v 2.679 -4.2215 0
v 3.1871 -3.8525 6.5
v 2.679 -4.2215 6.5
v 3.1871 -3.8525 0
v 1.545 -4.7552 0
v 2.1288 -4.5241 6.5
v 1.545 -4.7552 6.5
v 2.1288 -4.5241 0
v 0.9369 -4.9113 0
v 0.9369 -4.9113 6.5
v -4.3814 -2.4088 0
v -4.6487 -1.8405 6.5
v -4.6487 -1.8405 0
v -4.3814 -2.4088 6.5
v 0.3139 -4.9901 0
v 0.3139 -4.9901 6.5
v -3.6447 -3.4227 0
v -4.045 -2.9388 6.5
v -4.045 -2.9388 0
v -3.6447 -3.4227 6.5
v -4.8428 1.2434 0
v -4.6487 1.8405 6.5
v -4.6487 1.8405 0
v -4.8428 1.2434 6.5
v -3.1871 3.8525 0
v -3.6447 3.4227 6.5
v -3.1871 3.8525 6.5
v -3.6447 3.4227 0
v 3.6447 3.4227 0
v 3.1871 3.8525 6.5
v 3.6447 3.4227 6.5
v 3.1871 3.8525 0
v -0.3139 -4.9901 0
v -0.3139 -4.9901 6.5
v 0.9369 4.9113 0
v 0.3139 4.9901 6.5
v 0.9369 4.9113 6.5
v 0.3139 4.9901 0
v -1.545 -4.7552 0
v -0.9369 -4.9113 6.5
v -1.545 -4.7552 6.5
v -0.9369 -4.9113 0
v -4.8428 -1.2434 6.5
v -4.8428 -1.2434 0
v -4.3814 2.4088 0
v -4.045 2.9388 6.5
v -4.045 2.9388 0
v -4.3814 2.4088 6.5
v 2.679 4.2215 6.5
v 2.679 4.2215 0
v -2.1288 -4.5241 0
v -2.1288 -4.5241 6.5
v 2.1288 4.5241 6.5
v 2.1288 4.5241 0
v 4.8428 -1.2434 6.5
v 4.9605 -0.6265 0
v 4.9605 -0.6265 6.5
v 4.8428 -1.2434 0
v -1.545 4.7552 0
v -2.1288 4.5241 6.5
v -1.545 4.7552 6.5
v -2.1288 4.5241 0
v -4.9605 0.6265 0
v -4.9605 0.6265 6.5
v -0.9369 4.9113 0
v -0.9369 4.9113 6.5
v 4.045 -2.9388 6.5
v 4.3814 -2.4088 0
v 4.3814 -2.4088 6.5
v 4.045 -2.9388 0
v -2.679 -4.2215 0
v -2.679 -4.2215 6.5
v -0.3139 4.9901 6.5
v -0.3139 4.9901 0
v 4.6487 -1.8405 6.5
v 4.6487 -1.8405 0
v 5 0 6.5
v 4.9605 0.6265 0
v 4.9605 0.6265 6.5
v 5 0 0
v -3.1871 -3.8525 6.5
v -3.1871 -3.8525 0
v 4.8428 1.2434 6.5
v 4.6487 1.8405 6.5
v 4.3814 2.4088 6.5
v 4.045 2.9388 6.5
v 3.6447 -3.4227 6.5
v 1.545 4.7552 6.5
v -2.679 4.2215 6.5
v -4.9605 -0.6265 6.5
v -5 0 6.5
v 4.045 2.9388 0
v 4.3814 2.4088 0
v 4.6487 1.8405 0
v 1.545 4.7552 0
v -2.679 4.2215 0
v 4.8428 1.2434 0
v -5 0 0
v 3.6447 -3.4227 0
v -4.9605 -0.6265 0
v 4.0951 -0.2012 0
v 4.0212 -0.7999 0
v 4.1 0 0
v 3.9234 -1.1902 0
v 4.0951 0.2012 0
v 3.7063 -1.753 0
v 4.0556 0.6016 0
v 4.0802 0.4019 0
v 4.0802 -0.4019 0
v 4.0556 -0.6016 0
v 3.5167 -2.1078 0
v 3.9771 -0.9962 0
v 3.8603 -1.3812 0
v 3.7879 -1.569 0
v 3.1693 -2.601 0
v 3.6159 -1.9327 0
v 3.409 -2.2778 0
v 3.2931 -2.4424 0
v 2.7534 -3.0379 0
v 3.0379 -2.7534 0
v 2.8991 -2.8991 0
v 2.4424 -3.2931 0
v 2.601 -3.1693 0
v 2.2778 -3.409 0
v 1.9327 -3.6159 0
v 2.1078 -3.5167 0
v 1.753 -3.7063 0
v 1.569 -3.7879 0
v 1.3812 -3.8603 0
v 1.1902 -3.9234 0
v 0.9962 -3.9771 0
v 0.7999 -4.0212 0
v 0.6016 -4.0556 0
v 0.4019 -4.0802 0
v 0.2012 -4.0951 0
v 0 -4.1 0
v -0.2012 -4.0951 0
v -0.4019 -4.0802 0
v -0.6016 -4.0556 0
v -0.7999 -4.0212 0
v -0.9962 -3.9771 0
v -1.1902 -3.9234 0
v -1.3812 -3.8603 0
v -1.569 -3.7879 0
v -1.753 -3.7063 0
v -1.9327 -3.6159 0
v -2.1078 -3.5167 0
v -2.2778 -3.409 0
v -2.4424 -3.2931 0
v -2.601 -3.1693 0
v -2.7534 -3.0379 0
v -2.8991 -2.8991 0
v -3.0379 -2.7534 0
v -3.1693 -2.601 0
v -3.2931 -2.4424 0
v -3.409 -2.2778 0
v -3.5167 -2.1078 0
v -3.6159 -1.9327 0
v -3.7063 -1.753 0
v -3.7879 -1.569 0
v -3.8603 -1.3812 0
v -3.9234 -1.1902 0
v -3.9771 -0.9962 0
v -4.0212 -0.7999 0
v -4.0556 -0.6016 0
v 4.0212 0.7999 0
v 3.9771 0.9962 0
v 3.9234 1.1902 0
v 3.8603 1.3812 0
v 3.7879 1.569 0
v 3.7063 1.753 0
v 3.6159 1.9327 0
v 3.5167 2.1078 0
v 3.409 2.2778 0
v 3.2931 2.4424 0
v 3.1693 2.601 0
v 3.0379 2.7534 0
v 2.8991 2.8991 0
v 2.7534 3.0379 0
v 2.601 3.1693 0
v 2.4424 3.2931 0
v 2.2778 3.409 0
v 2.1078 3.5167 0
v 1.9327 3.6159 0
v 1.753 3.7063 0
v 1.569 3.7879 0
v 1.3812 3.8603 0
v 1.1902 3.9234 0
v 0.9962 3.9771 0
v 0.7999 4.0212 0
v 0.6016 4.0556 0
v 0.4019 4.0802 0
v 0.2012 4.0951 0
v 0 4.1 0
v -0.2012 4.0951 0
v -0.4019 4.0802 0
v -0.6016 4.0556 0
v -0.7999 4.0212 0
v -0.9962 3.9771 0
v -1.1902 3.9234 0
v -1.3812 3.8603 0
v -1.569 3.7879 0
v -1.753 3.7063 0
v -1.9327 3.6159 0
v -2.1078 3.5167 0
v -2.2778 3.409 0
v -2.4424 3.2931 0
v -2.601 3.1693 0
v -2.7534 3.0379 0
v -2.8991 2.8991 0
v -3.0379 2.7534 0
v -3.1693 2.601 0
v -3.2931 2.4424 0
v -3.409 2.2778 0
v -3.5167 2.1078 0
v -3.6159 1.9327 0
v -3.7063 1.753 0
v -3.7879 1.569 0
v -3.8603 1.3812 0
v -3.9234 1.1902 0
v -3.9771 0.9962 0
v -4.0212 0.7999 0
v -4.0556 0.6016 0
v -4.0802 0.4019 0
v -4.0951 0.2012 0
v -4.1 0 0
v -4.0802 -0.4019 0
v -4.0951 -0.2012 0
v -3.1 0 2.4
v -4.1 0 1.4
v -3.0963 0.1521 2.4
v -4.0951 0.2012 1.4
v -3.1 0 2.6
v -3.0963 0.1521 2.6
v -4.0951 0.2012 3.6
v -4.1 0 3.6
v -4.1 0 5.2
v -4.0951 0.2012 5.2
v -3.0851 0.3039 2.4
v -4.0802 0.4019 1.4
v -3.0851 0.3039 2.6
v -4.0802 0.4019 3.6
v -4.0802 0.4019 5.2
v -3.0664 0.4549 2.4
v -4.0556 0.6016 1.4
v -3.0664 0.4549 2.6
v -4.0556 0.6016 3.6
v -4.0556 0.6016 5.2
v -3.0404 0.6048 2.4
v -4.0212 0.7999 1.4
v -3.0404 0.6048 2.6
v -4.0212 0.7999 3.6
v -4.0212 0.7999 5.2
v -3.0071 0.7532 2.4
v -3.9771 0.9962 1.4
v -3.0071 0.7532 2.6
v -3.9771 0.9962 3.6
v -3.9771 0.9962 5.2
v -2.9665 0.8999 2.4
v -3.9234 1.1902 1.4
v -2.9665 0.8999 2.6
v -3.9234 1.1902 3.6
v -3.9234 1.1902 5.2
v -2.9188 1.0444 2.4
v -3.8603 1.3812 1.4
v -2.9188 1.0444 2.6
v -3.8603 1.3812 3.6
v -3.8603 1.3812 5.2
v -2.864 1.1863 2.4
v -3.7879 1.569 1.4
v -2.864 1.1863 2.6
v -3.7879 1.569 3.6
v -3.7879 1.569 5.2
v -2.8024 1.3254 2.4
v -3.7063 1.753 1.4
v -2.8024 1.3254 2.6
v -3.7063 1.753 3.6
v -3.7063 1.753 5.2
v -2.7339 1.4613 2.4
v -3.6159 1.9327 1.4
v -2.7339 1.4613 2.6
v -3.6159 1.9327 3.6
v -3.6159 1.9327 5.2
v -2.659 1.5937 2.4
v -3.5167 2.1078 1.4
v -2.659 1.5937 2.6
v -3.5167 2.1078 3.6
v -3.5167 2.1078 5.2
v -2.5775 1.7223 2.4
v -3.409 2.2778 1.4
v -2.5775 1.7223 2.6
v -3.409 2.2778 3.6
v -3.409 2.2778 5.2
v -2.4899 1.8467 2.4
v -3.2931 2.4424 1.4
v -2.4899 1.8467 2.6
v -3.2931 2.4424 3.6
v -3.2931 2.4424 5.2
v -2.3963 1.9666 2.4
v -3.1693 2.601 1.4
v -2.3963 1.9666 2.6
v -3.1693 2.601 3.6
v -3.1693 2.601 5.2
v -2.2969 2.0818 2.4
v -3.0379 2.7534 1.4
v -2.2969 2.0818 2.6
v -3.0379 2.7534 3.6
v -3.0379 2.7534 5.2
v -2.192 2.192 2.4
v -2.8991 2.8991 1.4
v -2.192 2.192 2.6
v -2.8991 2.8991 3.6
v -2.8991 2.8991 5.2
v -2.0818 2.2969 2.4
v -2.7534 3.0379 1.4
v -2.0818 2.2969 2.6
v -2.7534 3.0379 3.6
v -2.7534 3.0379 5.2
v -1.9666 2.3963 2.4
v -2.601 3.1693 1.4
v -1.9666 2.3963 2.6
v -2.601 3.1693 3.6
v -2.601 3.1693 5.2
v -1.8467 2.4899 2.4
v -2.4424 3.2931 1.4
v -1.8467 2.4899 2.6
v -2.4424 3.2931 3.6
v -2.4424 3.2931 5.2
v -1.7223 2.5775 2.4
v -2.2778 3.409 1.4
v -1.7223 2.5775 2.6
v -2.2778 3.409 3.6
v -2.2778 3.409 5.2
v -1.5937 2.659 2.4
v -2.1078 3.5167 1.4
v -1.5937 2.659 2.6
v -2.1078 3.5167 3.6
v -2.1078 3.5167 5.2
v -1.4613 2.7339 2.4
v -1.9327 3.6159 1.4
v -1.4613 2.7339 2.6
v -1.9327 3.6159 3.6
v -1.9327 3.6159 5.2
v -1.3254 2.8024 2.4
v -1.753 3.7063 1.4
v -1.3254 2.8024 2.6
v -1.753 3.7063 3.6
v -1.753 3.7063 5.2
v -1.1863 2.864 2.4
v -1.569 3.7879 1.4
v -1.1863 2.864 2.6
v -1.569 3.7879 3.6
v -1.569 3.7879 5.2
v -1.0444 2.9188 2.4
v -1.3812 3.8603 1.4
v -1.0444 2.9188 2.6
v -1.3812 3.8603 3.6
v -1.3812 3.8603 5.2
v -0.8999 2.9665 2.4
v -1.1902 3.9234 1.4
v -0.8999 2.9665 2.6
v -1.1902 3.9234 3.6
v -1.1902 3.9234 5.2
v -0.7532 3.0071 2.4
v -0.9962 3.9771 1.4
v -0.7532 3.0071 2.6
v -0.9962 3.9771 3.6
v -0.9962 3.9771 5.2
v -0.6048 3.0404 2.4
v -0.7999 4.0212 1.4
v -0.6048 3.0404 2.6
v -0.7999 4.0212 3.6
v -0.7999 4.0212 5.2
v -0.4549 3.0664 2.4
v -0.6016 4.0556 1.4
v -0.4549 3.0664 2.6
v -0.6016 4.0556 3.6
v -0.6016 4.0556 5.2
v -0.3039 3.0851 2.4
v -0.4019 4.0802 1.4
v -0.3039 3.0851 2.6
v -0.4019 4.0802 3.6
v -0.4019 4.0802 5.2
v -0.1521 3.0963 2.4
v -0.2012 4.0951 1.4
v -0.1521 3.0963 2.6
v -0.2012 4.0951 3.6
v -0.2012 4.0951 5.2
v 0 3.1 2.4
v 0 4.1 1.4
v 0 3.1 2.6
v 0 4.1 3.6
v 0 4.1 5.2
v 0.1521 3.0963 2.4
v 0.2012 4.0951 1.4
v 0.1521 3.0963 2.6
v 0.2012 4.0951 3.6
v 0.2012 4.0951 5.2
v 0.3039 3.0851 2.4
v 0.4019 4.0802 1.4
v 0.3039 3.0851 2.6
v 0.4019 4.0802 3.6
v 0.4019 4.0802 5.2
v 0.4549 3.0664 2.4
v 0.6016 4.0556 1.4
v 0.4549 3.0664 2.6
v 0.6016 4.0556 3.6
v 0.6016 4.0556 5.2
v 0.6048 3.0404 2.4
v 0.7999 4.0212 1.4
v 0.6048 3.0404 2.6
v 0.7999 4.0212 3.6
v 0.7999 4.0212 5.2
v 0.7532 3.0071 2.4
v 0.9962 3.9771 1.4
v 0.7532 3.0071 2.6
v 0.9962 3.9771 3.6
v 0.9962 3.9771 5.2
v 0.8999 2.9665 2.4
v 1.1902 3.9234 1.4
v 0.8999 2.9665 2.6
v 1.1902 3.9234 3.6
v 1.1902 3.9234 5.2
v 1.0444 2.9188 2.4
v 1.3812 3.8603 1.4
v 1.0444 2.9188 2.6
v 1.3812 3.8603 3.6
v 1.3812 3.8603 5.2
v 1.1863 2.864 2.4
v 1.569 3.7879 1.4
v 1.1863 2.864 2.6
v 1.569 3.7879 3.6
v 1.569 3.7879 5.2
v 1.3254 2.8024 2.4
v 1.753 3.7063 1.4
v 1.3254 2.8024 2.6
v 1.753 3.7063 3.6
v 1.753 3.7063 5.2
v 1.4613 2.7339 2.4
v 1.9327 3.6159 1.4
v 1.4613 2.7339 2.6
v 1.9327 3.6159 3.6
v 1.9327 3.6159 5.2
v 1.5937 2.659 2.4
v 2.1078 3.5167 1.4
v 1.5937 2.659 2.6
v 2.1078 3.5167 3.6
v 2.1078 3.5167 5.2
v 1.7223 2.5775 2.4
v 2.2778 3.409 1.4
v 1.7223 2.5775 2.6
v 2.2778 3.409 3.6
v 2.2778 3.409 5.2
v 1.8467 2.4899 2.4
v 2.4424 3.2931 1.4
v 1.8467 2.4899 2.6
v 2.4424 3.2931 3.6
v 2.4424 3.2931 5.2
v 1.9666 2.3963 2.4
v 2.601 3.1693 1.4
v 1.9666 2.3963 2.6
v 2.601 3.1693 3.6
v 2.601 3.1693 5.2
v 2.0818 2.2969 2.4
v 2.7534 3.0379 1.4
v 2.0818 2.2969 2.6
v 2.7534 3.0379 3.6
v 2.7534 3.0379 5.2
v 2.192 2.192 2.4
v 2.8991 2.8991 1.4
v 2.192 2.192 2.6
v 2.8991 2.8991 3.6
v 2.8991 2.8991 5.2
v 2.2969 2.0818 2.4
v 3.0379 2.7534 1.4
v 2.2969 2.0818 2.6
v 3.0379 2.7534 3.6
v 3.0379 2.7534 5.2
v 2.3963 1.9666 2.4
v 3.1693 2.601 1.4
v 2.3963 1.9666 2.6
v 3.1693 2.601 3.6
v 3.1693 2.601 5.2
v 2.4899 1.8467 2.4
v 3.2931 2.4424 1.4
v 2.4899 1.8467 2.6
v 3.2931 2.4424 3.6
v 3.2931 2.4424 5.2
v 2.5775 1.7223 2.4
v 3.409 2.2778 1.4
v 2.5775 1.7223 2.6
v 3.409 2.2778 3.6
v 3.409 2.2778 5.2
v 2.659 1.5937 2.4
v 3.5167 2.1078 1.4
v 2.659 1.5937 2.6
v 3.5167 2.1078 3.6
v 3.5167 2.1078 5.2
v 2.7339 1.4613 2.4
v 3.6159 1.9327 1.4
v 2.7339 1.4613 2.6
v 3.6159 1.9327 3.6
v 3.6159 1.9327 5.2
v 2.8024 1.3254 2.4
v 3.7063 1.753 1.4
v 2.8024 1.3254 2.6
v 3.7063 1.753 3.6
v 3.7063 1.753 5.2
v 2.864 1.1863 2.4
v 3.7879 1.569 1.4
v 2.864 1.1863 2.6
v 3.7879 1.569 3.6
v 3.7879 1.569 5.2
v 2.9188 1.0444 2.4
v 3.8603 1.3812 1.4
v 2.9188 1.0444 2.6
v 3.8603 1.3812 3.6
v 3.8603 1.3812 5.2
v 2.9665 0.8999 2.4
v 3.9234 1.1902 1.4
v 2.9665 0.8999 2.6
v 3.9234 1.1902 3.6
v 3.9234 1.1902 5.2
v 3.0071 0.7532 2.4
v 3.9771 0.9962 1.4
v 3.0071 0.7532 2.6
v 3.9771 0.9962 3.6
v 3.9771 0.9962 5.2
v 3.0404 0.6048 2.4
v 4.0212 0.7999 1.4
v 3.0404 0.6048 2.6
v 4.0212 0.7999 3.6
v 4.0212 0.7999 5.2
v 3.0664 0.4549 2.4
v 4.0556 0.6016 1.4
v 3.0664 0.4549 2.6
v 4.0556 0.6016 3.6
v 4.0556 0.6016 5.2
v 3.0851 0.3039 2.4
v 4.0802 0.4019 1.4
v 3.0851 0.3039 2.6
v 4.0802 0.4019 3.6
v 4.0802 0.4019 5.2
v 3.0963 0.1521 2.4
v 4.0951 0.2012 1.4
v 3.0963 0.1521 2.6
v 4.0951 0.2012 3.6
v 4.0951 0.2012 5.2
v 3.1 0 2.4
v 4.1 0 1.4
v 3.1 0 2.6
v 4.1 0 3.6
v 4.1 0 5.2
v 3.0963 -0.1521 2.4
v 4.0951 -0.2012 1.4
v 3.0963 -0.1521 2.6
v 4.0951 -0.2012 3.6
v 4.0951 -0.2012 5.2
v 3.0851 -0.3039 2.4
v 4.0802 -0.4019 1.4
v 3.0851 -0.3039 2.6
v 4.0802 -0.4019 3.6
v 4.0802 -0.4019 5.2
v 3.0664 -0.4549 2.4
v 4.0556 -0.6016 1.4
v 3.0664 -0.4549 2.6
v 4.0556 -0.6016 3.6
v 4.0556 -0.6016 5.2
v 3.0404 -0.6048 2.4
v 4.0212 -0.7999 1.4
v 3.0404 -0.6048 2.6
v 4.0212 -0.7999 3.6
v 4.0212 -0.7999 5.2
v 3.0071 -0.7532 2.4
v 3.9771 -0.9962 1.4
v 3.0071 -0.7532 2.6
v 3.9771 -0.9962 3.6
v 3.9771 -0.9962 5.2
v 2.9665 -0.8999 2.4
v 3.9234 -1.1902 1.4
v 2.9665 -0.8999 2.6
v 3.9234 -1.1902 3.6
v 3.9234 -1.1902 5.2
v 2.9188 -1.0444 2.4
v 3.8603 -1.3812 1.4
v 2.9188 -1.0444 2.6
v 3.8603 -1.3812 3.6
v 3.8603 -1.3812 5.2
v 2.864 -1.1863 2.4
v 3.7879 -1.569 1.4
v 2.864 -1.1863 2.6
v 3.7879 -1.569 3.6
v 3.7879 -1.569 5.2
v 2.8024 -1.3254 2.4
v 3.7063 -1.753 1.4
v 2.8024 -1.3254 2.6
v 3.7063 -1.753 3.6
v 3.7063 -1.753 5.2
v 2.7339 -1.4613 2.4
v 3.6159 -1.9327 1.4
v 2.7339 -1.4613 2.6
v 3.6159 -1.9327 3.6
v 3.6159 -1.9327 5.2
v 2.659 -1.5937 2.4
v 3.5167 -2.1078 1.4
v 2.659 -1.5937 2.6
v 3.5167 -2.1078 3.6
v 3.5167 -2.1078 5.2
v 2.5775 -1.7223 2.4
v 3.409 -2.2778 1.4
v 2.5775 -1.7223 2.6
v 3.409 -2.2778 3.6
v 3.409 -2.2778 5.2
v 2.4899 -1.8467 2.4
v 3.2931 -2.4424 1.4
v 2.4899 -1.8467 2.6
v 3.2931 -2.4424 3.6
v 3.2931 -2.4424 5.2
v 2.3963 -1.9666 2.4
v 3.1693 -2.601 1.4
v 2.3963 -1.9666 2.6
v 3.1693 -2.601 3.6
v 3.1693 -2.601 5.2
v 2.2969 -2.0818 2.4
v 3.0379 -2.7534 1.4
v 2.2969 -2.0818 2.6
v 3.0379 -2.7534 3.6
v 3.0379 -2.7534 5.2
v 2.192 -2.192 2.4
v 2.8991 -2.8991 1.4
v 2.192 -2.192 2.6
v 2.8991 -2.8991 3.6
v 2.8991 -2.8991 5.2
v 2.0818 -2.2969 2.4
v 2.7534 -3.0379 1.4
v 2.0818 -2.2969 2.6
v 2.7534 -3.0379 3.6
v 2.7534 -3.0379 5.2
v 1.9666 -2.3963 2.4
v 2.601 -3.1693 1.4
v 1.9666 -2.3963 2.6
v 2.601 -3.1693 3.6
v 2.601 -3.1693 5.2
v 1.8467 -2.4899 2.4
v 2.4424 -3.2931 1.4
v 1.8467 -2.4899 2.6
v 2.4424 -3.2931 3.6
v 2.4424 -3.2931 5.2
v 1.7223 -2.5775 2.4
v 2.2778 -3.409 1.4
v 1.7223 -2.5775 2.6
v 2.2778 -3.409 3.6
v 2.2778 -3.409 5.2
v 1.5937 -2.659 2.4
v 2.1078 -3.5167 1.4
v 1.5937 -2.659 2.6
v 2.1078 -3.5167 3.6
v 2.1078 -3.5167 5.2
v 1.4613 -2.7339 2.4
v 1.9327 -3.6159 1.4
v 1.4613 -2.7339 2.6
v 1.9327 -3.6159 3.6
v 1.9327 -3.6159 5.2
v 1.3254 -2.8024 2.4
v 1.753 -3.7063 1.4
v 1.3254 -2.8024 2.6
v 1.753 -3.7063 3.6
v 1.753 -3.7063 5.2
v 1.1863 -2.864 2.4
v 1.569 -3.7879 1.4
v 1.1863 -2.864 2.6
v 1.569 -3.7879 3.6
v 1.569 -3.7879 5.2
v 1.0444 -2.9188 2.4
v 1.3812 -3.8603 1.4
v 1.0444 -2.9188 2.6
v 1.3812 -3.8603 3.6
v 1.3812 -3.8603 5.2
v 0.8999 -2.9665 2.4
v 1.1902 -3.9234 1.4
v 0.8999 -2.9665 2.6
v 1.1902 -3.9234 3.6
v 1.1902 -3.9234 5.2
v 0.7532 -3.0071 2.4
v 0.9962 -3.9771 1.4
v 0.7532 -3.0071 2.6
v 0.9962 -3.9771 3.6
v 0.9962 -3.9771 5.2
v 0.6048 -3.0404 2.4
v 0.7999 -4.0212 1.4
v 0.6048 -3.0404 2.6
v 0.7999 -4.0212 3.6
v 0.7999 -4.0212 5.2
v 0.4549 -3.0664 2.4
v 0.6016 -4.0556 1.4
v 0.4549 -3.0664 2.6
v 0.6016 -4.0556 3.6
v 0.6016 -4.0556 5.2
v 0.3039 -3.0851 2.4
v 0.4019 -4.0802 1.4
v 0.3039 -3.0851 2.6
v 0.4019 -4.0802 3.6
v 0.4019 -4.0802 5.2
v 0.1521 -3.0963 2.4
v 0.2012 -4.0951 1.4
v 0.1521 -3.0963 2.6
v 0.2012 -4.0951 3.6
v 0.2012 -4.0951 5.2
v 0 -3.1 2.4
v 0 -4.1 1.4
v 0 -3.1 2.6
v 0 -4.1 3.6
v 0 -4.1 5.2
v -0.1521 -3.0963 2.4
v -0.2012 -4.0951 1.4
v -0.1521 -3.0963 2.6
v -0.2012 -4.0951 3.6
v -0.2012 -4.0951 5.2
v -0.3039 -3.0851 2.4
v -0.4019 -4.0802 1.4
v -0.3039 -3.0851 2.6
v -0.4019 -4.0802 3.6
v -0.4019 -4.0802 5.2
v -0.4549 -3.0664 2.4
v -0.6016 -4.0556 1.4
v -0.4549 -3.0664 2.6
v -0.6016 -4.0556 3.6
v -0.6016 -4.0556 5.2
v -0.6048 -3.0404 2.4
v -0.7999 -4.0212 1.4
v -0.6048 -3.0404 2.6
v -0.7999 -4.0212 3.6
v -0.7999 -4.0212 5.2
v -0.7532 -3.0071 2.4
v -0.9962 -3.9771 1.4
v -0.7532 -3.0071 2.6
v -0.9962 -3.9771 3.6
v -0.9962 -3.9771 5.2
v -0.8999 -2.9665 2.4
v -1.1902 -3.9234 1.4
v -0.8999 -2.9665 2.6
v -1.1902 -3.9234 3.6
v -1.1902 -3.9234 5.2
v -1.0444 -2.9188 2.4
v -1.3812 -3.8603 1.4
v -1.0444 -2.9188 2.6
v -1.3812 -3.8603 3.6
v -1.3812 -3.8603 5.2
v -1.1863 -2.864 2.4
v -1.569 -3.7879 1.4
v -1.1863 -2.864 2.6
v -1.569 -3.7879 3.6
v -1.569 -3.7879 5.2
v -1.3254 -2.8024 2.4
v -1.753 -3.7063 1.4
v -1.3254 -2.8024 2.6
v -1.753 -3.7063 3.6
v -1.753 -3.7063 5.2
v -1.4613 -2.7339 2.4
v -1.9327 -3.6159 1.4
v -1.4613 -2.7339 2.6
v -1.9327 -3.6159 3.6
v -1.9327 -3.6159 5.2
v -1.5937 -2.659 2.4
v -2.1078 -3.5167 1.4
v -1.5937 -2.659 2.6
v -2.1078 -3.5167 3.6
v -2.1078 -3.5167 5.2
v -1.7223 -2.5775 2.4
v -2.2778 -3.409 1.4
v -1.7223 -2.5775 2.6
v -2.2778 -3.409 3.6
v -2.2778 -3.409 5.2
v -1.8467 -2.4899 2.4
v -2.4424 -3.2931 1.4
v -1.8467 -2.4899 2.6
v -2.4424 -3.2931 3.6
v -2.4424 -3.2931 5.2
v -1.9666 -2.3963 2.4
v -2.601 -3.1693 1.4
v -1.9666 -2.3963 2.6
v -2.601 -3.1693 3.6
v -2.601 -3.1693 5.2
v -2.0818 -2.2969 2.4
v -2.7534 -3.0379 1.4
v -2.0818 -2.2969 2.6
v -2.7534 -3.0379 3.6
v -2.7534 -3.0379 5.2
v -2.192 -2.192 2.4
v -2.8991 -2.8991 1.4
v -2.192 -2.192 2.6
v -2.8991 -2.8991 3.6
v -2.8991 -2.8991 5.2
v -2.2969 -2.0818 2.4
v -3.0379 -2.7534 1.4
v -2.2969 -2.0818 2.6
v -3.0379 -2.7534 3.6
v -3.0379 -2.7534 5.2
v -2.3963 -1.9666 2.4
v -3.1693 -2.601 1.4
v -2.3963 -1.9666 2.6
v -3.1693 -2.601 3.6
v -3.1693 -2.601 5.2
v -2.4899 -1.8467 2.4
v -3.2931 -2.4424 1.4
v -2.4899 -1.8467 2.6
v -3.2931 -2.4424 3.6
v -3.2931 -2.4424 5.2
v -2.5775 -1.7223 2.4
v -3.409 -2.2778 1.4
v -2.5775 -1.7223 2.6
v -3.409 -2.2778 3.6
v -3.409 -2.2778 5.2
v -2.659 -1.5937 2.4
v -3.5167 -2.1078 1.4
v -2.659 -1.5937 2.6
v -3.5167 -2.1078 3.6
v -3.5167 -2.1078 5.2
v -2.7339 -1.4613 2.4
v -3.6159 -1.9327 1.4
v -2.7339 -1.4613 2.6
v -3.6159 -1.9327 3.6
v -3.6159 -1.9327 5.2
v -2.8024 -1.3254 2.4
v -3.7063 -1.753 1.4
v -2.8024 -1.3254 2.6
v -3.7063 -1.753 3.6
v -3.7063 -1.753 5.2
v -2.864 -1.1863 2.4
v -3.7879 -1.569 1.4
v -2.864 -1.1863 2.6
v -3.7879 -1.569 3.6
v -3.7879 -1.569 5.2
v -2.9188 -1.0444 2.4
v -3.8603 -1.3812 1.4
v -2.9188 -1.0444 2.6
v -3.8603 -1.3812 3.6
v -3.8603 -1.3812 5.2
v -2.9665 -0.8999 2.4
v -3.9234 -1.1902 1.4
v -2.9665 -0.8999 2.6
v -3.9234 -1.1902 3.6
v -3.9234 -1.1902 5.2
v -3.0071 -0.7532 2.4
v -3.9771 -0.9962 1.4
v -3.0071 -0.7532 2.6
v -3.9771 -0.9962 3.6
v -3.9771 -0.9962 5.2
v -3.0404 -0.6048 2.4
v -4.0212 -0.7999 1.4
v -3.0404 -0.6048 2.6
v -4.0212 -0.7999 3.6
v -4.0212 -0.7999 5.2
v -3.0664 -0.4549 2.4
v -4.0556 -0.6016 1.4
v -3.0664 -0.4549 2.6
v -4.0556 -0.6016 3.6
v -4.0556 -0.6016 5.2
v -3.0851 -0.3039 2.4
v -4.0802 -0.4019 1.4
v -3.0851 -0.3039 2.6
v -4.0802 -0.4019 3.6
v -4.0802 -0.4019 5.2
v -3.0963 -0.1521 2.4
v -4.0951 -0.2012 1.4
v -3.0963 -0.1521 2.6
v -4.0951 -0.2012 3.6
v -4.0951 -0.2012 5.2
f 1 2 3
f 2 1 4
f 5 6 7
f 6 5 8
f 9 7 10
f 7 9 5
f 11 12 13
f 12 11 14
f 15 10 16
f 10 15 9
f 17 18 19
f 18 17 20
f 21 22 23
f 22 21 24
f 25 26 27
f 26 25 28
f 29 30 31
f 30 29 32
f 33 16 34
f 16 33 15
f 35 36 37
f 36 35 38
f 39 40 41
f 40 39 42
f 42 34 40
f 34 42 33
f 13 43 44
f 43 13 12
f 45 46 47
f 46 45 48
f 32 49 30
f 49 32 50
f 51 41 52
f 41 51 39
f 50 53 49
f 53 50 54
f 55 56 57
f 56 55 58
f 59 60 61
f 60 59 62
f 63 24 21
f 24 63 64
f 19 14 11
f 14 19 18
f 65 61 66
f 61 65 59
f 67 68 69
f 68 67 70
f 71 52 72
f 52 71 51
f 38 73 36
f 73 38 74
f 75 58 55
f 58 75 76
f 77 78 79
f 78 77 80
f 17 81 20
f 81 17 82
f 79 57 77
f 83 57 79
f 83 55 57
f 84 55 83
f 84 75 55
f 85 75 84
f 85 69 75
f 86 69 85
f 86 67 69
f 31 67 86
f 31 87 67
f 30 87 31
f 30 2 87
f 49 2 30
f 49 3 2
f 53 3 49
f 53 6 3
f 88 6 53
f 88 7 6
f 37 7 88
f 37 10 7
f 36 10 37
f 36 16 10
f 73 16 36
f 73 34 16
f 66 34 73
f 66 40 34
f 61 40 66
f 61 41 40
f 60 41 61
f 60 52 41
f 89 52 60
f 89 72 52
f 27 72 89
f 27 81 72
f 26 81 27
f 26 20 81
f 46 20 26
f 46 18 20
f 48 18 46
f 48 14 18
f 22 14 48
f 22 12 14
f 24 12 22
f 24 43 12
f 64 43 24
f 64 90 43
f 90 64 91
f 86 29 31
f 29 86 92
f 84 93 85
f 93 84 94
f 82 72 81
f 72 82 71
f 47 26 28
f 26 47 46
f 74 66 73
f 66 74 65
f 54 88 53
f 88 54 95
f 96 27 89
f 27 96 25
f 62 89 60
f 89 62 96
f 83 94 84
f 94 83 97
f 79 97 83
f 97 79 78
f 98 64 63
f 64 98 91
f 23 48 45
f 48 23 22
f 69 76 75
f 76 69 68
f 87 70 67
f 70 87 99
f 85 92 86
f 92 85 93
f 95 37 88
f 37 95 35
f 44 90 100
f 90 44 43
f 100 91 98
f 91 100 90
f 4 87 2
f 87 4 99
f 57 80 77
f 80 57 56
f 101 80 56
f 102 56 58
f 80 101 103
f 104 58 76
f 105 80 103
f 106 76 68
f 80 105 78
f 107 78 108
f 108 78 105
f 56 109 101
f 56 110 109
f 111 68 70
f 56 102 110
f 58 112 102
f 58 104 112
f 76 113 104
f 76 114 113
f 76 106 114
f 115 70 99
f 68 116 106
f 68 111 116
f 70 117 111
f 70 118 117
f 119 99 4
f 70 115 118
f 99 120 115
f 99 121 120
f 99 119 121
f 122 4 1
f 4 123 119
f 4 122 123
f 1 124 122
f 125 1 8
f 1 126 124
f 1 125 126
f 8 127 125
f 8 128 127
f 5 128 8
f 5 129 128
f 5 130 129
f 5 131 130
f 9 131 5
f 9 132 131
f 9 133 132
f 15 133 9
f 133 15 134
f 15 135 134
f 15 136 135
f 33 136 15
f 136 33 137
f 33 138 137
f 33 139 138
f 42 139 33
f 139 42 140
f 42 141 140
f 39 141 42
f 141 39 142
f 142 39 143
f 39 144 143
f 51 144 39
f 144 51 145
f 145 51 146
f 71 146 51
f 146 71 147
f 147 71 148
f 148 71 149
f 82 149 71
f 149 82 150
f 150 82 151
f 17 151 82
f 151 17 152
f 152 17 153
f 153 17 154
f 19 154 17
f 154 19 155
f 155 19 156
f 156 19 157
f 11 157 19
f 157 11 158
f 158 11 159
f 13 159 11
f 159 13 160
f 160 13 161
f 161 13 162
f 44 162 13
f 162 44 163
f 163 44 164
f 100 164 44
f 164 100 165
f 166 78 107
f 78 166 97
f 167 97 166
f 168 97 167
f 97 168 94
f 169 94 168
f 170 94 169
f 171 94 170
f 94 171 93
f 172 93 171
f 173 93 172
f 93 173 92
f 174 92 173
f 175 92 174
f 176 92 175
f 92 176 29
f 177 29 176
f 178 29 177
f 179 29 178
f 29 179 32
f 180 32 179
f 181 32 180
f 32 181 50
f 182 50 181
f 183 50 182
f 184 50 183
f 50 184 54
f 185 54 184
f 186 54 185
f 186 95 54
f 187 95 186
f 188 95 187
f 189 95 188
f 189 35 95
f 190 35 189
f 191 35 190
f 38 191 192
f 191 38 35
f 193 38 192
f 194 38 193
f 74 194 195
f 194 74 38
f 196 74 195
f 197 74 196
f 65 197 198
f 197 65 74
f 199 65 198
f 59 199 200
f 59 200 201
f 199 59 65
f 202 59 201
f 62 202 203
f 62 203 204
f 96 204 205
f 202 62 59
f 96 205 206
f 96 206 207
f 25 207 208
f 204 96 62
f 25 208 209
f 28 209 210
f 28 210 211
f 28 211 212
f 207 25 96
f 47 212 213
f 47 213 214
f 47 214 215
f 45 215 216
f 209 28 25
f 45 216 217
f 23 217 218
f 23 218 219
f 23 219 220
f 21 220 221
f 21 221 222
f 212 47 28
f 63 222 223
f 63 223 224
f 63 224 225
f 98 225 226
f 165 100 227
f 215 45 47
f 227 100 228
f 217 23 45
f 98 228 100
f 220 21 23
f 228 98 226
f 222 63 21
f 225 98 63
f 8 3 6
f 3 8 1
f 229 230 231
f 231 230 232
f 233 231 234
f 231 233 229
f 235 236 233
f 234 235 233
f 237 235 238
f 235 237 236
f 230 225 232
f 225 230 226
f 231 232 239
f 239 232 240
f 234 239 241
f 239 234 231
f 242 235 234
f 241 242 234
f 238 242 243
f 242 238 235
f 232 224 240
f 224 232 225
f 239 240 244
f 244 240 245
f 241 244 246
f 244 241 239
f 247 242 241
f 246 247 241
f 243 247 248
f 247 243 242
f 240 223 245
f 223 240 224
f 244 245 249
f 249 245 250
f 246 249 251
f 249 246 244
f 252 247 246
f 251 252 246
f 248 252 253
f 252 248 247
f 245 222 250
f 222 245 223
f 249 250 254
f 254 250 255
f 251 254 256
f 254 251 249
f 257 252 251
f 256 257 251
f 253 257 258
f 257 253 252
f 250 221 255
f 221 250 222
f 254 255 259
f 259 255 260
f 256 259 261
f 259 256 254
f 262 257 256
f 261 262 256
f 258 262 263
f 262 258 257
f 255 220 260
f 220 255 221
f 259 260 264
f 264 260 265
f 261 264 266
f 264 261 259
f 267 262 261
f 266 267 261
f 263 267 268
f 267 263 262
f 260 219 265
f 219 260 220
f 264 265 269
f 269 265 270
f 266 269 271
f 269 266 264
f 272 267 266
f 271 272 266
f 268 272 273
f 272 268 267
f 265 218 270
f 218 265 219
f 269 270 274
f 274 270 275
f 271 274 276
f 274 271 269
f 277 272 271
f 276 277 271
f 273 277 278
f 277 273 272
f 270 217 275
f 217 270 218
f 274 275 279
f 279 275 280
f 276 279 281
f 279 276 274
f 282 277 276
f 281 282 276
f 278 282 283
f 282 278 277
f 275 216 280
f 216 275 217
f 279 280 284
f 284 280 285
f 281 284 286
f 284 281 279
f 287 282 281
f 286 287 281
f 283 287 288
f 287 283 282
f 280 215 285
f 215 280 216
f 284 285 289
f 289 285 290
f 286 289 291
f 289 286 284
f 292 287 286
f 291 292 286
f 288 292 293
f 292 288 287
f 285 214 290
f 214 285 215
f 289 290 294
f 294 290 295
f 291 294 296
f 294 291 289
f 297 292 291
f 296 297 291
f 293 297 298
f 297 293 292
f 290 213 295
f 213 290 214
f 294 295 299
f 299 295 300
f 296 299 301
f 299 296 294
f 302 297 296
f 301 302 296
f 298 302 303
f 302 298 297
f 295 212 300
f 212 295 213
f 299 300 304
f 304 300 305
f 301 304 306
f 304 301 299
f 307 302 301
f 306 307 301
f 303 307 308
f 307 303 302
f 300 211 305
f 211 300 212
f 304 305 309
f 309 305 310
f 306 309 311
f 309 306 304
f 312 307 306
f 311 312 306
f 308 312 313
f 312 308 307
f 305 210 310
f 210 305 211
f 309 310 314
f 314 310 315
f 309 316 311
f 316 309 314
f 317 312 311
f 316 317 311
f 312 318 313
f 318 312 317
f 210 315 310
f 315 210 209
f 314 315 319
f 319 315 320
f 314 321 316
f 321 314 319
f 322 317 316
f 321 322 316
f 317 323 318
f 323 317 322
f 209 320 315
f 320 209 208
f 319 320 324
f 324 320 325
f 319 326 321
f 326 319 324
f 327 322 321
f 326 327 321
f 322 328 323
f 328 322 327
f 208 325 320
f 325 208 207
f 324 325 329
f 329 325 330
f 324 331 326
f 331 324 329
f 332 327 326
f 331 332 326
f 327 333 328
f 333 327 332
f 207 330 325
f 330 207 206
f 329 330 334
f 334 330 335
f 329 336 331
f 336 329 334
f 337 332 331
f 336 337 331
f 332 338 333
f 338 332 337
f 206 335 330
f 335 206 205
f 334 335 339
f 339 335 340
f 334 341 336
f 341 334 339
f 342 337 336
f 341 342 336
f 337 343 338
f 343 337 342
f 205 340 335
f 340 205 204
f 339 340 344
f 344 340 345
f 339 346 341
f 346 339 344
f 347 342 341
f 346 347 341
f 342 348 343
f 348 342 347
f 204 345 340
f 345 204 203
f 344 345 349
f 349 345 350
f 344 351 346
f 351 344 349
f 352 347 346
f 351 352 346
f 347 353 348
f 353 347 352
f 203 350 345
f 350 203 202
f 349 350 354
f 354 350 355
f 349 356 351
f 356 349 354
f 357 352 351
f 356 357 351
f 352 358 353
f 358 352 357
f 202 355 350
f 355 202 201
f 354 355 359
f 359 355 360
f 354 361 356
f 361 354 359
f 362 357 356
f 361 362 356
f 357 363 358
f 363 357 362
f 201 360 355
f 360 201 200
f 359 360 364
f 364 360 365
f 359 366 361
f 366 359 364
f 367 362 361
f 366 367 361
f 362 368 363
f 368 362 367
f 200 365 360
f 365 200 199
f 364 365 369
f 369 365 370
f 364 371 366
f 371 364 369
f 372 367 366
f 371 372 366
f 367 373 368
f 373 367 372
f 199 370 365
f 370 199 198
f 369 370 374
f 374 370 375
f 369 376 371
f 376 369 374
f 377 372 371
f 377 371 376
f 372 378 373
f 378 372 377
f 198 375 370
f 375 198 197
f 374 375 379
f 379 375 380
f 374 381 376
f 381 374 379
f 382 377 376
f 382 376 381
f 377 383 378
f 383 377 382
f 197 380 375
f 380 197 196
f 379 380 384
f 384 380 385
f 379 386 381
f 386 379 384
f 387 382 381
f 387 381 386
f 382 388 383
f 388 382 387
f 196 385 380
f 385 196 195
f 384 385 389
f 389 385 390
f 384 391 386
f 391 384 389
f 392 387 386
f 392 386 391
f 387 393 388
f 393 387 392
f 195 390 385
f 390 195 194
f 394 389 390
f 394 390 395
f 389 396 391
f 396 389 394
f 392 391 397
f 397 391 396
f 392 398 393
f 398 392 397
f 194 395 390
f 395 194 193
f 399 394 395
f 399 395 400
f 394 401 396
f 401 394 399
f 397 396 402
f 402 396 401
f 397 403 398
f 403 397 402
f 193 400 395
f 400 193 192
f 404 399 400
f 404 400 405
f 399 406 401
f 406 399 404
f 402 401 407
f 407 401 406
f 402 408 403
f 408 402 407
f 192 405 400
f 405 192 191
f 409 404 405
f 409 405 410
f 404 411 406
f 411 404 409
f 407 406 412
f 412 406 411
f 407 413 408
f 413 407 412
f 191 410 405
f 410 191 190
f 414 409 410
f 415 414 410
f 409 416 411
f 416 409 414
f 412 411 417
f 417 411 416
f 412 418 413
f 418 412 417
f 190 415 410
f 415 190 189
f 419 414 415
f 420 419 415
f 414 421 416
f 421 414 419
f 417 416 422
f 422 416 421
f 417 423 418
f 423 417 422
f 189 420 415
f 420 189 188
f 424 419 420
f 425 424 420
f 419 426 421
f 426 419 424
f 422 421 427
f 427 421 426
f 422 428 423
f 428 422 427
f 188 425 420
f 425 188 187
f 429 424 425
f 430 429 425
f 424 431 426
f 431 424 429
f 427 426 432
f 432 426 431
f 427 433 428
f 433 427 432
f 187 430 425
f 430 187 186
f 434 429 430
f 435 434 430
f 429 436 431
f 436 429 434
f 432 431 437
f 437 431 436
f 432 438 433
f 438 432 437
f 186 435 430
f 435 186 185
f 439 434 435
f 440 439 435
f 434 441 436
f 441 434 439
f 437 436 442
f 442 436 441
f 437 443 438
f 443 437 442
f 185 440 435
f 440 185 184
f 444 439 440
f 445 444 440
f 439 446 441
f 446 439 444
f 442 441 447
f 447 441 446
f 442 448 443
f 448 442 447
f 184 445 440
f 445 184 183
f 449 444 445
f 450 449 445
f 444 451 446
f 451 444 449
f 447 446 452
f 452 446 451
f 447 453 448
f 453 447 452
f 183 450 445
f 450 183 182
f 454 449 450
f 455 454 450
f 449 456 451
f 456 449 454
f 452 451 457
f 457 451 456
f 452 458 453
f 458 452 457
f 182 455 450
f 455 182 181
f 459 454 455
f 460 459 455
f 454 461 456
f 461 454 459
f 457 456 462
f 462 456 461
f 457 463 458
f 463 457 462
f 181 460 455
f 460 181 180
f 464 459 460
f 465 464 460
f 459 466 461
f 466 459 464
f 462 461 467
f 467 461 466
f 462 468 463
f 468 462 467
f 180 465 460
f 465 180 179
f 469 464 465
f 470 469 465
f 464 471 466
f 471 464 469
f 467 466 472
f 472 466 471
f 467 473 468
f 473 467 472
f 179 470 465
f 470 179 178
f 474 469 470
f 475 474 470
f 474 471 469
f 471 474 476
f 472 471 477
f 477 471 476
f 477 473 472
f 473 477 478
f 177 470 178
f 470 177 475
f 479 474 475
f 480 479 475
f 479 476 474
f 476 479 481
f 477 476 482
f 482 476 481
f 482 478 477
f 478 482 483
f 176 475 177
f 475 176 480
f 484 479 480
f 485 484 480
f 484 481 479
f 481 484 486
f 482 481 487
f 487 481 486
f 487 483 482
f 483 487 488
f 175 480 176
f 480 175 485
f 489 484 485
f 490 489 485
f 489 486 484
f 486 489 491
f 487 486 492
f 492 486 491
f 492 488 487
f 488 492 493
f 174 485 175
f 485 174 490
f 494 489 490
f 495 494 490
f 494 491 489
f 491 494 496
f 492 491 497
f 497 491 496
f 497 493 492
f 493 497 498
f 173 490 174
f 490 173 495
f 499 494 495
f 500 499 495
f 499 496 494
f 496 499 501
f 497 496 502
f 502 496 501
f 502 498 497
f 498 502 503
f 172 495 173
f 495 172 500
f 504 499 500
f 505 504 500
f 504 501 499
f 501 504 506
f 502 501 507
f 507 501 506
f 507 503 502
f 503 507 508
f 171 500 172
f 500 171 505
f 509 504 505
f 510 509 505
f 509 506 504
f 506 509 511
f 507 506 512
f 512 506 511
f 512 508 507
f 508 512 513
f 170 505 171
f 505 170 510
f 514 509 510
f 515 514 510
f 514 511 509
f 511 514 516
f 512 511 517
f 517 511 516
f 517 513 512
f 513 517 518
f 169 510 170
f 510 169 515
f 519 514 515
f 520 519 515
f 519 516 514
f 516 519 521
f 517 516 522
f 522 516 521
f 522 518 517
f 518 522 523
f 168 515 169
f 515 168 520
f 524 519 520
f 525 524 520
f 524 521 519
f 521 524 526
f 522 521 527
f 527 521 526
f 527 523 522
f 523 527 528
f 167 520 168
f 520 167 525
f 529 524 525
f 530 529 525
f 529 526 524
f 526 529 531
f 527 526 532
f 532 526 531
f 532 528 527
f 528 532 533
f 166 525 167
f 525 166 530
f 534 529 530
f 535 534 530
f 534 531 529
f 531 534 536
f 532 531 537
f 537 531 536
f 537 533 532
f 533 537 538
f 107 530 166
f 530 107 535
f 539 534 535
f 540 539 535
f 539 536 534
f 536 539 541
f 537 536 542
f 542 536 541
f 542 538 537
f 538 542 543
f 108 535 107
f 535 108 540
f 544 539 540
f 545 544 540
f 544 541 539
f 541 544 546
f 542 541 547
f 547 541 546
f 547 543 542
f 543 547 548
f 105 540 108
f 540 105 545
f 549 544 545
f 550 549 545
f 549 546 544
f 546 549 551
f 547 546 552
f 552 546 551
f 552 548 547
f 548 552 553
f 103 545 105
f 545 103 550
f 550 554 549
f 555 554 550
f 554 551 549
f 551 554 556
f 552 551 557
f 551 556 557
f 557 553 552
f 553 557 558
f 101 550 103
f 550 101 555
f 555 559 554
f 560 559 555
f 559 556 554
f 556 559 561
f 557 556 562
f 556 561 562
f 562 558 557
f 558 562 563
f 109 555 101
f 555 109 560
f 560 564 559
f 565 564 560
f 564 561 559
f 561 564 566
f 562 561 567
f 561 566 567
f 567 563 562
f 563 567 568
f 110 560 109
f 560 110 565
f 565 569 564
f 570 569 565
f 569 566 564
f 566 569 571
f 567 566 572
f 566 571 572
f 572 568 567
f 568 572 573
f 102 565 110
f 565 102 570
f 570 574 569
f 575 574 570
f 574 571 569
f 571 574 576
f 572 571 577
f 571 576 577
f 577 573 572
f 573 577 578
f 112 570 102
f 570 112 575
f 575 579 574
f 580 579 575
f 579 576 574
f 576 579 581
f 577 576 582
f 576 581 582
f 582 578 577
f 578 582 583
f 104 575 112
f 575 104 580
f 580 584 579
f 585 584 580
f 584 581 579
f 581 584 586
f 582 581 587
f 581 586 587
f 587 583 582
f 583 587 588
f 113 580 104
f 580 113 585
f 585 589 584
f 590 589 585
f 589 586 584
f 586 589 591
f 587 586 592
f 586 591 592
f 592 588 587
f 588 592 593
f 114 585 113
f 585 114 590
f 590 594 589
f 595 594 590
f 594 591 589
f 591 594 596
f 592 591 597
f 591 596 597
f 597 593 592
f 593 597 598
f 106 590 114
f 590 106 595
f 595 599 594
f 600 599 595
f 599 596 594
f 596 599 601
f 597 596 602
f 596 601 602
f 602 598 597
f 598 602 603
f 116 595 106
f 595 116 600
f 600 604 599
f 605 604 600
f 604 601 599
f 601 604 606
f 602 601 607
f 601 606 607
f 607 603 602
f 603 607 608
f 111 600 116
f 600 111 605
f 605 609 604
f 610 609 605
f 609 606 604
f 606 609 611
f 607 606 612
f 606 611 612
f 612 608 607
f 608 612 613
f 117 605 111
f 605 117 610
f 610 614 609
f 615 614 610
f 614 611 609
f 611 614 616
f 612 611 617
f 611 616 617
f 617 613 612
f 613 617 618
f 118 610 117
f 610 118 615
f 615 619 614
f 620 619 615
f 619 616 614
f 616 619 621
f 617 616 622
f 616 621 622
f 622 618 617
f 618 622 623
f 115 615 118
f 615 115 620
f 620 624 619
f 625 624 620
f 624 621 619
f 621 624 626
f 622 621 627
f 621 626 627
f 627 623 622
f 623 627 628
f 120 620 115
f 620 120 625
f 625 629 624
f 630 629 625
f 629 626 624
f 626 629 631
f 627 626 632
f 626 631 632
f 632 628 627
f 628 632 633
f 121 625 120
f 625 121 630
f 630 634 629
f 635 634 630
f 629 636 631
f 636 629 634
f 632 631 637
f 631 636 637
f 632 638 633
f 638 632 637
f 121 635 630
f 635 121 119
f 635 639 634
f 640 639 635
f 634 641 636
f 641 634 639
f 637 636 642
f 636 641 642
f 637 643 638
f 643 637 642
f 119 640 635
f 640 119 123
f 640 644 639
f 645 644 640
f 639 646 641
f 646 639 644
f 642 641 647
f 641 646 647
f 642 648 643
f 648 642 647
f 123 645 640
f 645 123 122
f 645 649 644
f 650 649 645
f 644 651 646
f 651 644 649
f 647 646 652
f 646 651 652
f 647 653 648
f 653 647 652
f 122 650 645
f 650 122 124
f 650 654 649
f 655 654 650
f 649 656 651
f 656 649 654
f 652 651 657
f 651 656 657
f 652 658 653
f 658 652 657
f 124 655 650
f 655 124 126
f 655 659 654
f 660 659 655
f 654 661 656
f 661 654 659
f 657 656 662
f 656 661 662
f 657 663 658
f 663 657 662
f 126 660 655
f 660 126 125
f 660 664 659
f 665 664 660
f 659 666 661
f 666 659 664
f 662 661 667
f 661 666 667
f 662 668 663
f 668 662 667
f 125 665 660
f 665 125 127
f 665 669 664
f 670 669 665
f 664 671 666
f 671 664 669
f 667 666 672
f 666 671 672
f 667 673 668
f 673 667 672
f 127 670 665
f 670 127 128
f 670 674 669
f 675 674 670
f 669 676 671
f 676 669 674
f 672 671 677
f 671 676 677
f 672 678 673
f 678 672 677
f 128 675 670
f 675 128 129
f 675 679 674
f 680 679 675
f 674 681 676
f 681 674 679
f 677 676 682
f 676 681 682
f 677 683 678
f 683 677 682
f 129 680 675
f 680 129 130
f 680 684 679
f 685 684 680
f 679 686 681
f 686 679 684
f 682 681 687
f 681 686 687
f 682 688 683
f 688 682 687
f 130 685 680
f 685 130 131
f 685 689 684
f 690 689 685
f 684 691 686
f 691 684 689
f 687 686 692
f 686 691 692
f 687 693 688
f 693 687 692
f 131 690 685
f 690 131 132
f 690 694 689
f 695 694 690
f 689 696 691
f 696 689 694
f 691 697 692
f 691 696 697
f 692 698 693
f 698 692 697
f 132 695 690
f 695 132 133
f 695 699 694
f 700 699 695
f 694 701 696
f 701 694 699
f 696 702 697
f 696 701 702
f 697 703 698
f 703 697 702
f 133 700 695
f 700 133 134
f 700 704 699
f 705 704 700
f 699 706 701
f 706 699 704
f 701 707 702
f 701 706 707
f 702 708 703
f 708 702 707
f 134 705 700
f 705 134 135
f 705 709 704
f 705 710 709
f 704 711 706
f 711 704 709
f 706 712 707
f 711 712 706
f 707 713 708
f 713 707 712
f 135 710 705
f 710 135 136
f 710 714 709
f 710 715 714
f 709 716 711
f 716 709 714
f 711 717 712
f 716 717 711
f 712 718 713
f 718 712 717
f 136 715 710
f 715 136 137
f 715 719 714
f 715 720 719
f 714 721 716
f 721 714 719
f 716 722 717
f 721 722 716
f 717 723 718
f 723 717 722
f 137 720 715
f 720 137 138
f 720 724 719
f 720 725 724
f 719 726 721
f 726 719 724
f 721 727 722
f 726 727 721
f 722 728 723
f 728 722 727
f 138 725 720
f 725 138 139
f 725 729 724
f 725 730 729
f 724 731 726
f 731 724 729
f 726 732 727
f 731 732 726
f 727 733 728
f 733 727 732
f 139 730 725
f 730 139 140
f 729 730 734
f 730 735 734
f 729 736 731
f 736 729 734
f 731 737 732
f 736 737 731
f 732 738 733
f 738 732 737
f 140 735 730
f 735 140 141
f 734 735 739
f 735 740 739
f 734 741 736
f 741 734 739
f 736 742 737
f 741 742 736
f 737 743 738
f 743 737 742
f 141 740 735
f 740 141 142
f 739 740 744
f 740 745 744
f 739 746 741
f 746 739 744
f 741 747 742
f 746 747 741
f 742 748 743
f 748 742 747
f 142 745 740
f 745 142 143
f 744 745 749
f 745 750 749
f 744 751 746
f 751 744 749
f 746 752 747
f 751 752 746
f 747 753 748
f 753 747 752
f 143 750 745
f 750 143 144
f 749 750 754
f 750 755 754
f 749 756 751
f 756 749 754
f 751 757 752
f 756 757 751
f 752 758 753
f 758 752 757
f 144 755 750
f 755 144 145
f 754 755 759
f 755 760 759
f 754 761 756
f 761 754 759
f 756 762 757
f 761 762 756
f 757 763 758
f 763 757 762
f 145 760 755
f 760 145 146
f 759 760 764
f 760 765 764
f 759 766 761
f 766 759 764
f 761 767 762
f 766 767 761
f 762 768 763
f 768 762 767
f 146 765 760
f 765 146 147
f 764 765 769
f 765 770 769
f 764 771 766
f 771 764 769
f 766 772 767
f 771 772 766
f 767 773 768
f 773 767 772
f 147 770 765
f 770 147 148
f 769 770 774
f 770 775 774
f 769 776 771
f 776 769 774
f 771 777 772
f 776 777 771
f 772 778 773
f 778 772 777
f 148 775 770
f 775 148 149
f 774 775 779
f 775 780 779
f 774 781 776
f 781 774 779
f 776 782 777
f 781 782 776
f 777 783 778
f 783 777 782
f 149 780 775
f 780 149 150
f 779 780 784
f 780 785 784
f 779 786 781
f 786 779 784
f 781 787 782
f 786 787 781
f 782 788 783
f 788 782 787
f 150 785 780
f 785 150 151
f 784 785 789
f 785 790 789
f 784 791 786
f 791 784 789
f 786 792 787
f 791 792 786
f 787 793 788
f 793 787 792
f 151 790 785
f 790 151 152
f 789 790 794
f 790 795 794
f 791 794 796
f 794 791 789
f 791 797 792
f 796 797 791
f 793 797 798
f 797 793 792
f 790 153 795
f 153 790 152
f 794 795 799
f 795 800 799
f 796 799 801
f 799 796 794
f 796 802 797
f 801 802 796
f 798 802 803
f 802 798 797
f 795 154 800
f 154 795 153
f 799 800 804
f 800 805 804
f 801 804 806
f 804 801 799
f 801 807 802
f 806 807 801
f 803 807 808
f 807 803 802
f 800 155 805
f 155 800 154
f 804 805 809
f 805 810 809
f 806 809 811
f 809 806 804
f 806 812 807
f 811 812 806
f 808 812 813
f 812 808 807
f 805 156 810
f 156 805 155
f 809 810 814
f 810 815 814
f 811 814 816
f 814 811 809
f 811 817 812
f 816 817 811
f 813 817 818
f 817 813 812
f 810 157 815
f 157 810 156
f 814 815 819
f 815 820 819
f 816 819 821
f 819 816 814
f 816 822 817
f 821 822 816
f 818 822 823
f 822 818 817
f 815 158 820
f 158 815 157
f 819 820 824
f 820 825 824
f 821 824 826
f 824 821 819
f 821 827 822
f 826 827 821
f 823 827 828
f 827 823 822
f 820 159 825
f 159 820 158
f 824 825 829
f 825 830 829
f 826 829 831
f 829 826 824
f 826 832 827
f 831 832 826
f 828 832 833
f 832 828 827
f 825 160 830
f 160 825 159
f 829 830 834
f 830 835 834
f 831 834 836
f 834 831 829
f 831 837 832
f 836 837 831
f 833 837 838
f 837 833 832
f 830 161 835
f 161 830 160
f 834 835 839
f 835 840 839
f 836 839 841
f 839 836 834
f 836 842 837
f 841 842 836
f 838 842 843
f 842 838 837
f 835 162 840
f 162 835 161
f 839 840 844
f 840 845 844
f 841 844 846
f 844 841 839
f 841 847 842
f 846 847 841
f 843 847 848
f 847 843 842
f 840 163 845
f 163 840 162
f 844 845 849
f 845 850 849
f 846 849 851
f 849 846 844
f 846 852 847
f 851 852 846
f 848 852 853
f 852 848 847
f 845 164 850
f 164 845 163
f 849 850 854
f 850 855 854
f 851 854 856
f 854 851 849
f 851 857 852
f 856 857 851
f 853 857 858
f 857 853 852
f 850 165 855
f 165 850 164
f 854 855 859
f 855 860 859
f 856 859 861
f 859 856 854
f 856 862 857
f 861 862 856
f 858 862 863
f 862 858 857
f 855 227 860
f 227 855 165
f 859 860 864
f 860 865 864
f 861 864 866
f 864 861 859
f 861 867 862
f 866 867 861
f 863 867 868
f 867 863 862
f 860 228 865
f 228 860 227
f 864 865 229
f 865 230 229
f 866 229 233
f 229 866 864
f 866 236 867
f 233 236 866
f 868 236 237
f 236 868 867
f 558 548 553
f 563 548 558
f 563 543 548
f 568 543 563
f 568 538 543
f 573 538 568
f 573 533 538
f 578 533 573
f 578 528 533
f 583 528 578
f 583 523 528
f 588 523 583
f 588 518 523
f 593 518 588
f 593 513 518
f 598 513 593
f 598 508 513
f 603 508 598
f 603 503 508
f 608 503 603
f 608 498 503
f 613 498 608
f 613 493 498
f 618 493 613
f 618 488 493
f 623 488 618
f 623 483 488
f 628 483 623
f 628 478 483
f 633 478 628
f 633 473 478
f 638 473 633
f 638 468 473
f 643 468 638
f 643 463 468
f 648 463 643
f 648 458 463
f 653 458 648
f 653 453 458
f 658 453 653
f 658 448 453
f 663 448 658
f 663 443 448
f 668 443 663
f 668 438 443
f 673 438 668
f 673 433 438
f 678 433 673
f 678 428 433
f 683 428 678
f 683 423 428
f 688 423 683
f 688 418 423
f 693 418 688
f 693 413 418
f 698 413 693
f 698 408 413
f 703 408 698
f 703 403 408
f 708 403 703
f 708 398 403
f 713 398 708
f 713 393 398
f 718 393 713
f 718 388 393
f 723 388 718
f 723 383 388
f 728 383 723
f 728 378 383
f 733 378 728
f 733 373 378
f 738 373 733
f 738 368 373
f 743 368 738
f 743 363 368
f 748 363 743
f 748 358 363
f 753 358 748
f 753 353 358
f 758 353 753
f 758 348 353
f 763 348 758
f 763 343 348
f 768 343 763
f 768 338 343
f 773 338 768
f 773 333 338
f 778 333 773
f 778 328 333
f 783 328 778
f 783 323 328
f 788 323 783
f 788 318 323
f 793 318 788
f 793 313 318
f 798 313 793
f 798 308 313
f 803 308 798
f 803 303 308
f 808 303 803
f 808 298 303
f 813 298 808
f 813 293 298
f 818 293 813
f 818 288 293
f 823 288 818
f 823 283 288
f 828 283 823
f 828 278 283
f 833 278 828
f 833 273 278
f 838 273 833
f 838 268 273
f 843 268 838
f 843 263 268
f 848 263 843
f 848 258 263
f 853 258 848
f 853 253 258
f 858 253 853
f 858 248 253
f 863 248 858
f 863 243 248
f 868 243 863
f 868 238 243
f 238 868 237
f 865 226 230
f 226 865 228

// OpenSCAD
difference()
{
    linear_extrude(height = 6.5, twist = 0.0, scale = 1.0, slices = 1, center = false)
    {
        scale([10.0, 10.0])
        {
            M401();
        }
    }
    rotate_extrude(angle = 360.0, $fn = 128)
    {
        M113();
    }
}

module M401()
{
    polygon
    (
        points =
        [
            [0.5, 0.0], 
            [0.49605735065723894, 0.06266661678215213], 
            [0.48429158056431554, 0.1243449435824274], 
            [0.46488824294412573, 0.18406227634233896], 
            [0.4381533400219318, 0.24087683705085766], 
            [0.4045084971874737, 0.29389262614623657], 
            [0.3644843137107058, 0.3422735529643443], 
            [0.3187119948743448, 0.3852566213878946], 
            [0.2679133974894983, 0.42216396275100754], 
            [0.21288964578253633, 0.4524135262330098], 
            [0.15450849718747373, 0.47552825814757677], 
            [0.09369065729286237, 0.4911436253643443], 
            [0.03139525976465676, 0.4990133642141358], 
            [-0.0313952597646567, 0.4990133642141358], 
            [-0.09369065729286241, 0.4911436253643443], 
            [-0.15450849718747367, 0.4755282581475768], 
            [-0.21288964578253636, 0.45241352623300973], 
            [-0.26791339748949844, 0.4221639627510075], 
            [-0.3187119948743449, 0.3852566213878946], 
            [-0.36448431371070567, 0.3422735529643444], 
            [-0.40450849718747367, 0.2938926261462366], 
            [-0.43815334002193174, 0.2408768370508578], 
            [-0.4648882429441257, 0.18406227634233907], 
            [-0.48429158056431554, 0.12434494358242741], 
            [-0.4960573506572389, 0.06266661678215227], 
            [-0.5, 6.123233995736766E-17], 
            [-0.4960573506572389, -0.06266661678215214], 
            [-0.48429158056431554, -0.12434494358242751], 
            [-0.4648882429441256, -0.18406227634233915], 
            [-0.43815334002193185, -0.2408768370508575], 
            [-0.4045084971874737, -0.2938926261462365], 
            [-0.3644843137107058, -0.34227355296434436], 
            [-0.31871199487434476, -0.3852566213878947], 
            [-0.26791339748949816, -0.42216396275100765], 
            [-0.21288964578253608, -0.4524135262330099], 
            [-0.15450849718747378, -0.47552825814757677], 
            [-0.09369065729286231, -0.4911436253643443], 
            [-0.031395259764656604, -0.4990133642141358], 
            [0.031395259764656416, -0.4990133642141358], 
            [0.09369065729286213, -0.4911436253643444], 
            [0.15450849718747361, -0.4755282581475768], 
            [0.2128896457825363, -0.4524135262330098], 
            [0.267913397489498, -0.42216396275100776], 
            [0.31871199487434465, -0.3852566213878948], 
            [0.3644843137107056, -0.3422735529643445], 
            [0.40450849718747367, -0.2938926261462367], 
            [0.4381533400219318, -0.24087683705085766], 
            [0.46488824294412573, -0.18406227634233893], 
            [0.4842915805643155, -0.12434494358242767], 
            [0.4960573506572389, -0.06266661678215232]
        ],
        paths =
        [
            [0, 1, 2, 3, 4, 5, 6, 7, 8, 9, 10, 11, 12, 13, 14, 15, 16, 17, 18, 19, 20, 21, 22, 23, 24, 25, 26, 27, 28, 29, 30, 31, 32, 33, 34, 35, 36, 37, 38, 39, 40, 41, 42, 43, 44, 45, 46, 47, 48, 49]
        ]
    );
}

module M113()
{
    polygon
    (
        points =
        [
            [0.0, -0.2], 
            [4.1, -0.2], 
            [4.1, 1.4], 
            [3.1, 2.4], 
            [3.1, 2.6], 
            [4.1, 3.6], 
            [4.1, 5.2], 
            [0.0, 5.2]
        ],
        paths =
        [
            [0, 1, 2, 3, 4, 5, 6, 7]
        ]
    );
}
